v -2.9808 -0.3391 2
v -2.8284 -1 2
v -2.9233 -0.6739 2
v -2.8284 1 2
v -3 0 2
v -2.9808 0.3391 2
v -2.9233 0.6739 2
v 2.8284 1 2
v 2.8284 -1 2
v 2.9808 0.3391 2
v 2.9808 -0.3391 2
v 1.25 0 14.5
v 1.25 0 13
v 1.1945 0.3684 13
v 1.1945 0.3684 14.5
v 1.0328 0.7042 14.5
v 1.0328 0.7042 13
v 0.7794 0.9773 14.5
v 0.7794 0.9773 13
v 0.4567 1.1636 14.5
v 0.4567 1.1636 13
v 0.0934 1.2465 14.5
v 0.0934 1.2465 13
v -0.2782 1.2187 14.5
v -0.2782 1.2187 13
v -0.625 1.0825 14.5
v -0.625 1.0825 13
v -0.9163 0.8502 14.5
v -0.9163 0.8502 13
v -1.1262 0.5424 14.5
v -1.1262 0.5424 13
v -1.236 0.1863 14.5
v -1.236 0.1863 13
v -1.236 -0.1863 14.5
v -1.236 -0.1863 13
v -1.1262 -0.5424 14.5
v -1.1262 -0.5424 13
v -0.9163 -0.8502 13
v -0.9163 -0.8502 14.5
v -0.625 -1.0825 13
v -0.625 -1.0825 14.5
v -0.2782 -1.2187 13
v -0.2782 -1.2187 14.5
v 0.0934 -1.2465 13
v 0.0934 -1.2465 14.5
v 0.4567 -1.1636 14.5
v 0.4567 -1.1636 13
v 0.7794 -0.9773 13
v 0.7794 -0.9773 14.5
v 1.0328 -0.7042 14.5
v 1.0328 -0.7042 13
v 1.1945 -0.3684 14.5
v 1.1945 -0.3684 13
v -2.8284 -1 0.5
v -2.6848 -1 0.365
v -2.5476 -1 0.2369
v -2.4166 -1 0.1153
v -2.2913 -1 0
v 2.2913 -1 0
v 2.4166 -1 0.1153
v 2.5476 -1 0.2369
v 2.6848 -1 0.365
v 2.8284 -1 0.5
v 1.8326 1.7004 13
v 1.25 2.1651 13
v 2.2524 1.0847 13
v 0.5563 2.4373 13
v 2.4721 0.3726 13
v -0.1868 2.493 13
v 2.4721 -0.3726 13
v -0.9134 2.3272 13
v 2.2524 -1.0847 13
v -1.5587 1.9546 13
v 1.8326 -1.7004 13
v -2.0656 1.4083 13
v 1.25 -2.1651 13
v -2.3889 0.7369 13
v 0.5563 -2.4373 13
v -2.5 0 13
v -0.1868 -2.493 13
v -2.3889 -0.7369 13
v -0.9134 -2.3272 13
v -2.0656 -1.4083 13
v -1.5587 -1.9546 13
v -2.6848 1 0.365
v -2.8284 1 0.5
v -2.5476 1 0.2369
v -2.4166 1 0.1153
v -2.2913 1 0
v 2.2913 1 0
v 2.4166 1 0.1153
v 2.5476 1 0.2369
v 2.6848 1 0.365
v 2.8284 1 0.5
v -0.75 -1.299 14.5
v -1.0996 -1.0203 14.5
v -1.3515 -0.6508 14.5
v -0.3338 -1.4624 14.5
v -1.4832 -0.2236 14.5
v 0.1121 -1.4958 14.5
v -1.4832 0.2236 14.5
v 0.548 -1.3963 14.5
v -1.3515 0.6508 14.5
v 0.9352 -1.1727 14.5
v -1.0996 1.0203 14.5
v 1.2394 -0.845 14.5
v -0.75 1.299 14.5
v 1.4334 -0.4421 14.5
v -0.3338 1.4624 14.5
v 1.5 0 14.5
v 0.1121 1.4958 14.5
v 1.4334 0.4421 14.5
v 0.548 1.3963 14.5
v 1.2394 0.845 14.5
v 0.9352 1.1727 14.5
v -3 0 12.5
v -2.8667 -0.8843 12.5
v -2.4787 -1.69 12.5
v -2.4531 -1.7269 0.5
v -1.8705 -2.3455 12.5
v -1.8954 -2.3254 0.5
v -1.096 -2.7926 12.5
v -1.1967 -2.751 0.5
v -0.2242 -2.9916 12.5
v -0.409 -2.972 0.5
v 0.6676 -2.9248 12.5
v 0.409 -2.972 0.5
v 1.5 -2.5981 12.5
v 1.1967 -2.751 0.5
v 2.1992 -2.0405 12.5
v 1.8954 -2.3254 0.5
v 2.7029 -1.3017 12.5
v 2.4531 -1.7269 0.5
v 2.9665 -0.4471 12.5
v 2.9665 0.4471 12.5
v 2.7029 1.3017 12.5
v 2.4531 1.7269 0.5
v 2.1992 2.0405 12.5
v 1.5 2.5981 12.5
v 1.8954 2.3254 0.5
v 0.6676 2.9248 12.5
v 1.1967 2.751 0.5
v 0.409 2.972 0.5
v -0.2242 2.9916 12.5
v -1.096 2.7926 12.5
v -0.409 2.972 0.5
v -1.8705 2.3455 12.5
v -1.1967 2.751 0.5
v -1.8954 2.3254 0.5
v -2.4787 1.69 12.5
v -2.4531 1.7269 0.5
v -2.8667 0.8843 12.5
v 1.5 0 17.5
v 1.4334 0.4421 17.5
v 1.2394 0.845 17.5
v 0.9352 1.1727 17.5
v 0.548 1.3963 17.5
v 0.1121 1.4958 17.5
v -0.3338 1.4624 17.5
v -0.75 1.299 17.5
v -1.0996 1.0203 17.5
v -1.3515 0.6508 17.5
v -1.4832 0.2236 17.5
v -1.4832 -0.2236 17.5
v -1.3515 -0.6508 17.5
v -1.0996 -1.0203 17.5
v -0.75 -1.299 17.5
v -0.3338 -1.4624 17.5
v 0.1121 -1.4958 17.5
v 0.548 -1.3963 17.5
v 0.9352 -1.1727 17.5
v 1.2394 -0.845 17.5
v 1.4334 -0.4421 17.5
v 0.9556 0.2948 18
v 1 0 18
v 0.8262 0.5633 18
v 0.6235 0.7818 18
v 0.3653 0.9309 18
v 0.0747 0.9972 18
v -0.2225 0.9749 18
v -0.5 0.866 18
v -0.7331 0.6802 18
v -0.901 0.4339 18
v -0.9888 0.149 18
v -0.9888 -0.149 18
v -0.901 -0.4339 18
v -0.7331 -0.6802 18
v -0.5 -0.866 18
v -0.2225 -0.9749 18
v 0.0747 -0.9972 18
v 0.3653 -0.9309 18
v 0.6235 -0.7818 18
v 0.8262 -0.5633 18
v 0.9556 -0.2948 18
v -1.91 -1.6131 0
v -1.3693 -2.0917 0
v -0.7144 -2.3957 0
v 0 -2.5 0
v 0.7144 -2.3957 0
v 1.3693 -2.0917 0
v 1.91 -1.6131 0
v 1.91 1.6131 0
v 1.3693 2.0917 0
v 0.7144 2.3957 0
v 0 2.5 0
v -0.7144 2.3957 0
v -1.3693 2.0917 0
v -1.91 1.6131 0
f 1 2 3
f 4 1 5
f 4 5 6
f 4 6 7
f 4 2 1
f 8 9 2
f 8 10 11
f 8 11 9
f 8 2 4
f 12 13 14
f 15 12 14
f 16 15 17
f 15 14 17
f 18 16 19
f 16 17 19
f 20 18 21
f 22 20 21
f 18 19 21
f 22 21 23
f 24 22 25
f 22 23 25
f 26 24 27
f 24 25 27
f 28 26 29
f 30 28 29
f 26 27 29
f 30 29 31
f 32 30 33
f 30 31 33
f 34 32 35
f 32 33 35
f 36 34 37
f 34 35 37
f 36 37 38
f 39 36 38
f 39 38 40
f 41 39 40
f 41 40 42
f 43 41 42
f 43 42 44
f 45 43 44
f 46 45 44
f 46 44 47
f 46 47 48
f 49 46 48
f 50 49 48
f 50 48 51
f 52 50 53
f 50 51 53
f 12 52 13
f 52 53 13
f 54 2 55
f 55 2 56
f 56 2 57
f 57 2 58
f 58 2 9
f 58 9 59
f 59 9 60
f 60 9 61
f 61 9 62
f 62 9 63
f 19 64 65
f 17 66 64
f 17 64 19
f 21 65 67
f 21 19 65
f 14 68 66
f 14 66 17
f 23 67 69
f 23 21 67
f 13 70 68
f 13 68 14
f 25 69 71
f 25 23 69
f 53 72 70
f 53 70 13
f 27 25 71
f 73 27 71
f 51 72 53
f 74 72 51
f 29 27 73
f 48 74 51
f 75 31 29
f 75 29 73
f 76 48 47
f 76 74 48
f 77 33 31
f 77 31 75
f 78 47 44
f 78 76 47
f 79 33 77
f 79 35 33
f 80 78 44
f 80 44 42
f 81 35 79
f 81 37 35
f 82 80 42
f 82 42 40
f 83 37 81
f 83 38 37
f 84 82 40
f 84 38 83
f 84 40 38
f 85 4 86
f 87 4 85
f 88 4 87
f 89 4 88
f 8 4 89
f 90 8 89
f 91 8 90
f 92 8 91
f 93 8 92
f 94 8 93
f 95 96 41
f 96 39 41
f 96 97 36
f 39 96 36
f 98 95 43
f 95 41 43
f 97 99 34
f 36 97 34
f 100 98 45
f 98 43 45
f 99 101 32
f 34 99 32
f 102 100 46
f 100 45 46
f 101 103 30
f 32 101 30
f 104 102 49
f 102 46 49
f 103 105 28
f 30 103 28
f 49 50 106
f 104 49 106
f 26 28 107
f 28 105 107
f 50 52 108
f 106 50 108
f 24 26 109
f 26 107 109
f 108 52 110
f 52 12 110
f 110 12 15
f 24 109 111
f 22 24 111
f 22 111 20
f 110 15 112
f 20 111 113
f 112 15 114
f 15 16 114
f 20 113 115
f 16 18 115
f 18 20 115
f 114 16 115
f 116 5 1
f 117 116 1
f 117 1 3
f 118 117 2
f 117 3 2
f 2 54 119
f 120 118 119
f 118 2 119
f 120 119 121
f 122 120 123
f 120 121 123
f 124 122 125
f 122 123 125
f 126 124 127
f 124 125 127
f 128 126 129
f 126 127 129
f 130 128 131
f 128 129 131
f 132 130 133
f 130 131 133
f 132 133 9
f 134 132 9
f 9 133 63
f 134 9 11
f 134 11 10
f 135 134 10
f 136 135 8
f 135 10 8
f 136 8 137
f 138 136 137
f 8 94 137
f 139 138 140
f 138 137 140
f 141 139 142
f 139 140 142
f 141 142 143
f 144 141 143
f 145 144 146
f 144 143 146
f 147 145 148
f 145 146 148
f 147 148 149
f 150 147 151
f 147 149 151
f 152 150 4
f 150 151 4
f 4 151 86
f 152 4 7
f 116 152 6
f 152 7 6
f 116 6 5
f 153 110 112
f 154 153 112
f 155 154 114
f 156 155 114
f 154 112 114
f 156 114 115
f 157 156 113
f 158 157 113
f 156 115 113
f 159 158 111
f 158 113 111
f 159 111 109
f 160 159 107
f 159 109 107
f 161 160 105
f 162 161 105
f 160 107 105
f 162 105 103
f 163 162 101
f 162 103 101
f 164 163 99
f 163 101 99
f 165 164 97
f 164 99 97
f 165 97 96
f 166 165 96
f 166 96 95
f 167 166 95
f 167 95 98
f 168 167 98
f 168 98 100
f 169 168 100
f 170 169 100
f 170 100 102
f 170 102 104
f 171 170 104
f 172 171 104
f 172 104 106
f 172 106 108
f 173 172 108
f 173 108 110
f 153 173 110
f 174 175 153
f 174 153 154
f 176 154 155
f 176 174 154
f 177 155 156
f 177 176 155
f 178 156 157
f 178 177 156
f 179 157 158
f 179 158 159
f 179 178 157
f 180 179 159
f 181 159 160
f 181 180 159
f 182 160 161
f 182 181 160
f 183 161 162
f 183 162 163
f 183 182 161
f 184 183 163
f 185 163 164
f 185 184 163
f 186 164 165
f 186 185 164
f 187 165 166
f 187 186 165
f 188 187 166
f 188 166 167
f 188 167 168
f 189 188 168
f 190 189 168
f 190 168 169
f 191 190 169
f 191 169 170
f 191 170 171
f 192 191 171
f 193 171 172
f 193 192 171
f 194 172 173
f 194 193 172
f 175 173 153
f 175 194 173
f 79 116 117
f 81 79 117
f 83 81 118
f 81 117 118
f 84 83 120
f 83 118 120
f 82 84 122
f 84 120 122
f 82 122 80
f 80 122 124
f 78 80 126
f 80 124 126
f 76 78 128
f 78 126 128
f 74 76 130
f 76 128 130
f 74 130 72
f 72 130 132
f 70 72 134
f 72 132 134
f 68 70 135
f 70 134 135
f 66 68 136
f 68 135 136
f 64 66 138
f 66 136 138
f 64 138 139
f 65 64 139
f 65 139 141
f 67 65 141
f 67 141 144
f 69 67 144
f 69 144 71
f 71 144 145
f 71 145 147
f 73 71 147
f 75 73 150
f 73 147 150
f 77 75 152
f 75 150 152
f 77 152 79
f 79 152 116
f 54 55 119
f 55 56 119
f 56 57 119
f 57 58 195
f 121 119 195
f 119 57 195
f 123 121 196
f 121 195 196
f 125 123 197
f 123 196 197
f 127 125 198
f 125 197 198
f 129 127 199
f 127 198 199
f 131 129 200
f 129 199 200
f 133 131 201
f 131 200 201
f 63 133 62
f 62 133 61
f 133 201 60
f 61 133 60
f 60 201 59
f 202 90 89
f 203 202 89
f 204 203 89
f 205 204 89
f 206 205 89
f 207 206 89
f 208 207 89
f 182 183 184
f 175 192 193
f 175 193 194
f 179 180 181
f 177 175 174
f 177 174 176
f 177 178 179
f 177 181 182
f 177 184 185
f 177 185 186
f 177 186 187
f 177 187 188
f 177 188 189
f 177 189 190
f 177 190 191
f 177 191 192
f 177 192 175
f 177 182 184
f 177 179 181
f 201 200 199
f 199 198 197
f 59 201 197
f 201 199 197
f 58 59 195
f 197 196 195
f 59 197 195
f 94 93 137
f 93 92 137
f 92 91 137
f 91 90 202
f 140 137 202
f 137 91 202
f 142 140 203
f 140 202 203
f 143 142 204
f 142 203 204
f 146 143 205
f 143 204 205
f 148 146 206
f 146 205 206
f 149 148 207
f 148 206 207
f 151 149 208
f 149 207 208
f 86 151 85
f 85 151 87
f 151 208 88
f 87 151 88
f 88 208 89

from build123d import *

# Parameters (mm, degrees)
SKETCH_1_R          = 3
EXTRUDE_1_DEPTH     = 13
SKETCH_2_R          = 1.5
EXTRUDE_2_DEPTH     = 5
CHAMFER_1_SIZE      = 0.5
SKETCH_3_R          = 1.5
SKETCH_3_R_2        = 1.25
CUT_EXTRUDE_3_DEPTH = 1.5
SKETCH_4_W          = 2
SKETCH_4_H          = 2
CUT_EXTRUDE_4_DEPTH = 10
CHAMFER_2_SIZE      = 0.5


with BuildPart() as part:
    # 草图1 → 拉伸1 (new body)
    with BuildSketch(Plane.XY):
        with Locations(Location((0, 0, 0), (0, 0, 180))):
            Circle(SKETCH_1_R)
    extrude(amount=EXTRUDE_1_DEPTH)

    # 草图2 → 拉伸2 (add)
    with BuildSketch(Plane.XY.offset(13)):
        Circle(SKETCH_2_R)
    extrude(amount=EXTRUDE_2_DEPTH)

    # 倒角1
    chamfer_1_edges = [part.edges().sort_by_distance(p)[0] for p in [
        (-1.5, 0, 18),
    ]]
    chamfer(chamfer_1_edges, length=CHAMFER_1_SIZE)

    # 草图3 → 拉伸3 (cut)
    with BuildSketch(Plane.XY.offset(13)):
        Circle(SKETCH_3_R)
        Circle(SKETCH_3_R_2, mode=Mode.SUBTRACT)
    extrude(amount=CUT_EXTRUDE_3_DEPTH, mode=Mode.SUBTRACT)

    # 草图4 → 拉伸4 (cut, symmetric)
    with BuildSketch(Plane(origin=(0, 0, 0), x_dir=(0, 0, -1), z_dir=(1, 0, 0))):
        with Locations((-1, 0)):
            Rectangle(SKETCH_4_W, SKETCH_4_H)
    extrude(amount=CUT_EXTRUDE_4_DEPTH, both=True, mode=Mode.SUBTRACT)

    # 倒角2
    chamfer_2_edges = [part.edges().sort_by_distance(p)[0] for p in [
        (0, 3, 0),
        (0, -3, 0),
        (3, 0, 13),
    ]]
    chamfer(chamfer_2_edges, length=CHAMFER_2_SIZE)


solid = part.part
